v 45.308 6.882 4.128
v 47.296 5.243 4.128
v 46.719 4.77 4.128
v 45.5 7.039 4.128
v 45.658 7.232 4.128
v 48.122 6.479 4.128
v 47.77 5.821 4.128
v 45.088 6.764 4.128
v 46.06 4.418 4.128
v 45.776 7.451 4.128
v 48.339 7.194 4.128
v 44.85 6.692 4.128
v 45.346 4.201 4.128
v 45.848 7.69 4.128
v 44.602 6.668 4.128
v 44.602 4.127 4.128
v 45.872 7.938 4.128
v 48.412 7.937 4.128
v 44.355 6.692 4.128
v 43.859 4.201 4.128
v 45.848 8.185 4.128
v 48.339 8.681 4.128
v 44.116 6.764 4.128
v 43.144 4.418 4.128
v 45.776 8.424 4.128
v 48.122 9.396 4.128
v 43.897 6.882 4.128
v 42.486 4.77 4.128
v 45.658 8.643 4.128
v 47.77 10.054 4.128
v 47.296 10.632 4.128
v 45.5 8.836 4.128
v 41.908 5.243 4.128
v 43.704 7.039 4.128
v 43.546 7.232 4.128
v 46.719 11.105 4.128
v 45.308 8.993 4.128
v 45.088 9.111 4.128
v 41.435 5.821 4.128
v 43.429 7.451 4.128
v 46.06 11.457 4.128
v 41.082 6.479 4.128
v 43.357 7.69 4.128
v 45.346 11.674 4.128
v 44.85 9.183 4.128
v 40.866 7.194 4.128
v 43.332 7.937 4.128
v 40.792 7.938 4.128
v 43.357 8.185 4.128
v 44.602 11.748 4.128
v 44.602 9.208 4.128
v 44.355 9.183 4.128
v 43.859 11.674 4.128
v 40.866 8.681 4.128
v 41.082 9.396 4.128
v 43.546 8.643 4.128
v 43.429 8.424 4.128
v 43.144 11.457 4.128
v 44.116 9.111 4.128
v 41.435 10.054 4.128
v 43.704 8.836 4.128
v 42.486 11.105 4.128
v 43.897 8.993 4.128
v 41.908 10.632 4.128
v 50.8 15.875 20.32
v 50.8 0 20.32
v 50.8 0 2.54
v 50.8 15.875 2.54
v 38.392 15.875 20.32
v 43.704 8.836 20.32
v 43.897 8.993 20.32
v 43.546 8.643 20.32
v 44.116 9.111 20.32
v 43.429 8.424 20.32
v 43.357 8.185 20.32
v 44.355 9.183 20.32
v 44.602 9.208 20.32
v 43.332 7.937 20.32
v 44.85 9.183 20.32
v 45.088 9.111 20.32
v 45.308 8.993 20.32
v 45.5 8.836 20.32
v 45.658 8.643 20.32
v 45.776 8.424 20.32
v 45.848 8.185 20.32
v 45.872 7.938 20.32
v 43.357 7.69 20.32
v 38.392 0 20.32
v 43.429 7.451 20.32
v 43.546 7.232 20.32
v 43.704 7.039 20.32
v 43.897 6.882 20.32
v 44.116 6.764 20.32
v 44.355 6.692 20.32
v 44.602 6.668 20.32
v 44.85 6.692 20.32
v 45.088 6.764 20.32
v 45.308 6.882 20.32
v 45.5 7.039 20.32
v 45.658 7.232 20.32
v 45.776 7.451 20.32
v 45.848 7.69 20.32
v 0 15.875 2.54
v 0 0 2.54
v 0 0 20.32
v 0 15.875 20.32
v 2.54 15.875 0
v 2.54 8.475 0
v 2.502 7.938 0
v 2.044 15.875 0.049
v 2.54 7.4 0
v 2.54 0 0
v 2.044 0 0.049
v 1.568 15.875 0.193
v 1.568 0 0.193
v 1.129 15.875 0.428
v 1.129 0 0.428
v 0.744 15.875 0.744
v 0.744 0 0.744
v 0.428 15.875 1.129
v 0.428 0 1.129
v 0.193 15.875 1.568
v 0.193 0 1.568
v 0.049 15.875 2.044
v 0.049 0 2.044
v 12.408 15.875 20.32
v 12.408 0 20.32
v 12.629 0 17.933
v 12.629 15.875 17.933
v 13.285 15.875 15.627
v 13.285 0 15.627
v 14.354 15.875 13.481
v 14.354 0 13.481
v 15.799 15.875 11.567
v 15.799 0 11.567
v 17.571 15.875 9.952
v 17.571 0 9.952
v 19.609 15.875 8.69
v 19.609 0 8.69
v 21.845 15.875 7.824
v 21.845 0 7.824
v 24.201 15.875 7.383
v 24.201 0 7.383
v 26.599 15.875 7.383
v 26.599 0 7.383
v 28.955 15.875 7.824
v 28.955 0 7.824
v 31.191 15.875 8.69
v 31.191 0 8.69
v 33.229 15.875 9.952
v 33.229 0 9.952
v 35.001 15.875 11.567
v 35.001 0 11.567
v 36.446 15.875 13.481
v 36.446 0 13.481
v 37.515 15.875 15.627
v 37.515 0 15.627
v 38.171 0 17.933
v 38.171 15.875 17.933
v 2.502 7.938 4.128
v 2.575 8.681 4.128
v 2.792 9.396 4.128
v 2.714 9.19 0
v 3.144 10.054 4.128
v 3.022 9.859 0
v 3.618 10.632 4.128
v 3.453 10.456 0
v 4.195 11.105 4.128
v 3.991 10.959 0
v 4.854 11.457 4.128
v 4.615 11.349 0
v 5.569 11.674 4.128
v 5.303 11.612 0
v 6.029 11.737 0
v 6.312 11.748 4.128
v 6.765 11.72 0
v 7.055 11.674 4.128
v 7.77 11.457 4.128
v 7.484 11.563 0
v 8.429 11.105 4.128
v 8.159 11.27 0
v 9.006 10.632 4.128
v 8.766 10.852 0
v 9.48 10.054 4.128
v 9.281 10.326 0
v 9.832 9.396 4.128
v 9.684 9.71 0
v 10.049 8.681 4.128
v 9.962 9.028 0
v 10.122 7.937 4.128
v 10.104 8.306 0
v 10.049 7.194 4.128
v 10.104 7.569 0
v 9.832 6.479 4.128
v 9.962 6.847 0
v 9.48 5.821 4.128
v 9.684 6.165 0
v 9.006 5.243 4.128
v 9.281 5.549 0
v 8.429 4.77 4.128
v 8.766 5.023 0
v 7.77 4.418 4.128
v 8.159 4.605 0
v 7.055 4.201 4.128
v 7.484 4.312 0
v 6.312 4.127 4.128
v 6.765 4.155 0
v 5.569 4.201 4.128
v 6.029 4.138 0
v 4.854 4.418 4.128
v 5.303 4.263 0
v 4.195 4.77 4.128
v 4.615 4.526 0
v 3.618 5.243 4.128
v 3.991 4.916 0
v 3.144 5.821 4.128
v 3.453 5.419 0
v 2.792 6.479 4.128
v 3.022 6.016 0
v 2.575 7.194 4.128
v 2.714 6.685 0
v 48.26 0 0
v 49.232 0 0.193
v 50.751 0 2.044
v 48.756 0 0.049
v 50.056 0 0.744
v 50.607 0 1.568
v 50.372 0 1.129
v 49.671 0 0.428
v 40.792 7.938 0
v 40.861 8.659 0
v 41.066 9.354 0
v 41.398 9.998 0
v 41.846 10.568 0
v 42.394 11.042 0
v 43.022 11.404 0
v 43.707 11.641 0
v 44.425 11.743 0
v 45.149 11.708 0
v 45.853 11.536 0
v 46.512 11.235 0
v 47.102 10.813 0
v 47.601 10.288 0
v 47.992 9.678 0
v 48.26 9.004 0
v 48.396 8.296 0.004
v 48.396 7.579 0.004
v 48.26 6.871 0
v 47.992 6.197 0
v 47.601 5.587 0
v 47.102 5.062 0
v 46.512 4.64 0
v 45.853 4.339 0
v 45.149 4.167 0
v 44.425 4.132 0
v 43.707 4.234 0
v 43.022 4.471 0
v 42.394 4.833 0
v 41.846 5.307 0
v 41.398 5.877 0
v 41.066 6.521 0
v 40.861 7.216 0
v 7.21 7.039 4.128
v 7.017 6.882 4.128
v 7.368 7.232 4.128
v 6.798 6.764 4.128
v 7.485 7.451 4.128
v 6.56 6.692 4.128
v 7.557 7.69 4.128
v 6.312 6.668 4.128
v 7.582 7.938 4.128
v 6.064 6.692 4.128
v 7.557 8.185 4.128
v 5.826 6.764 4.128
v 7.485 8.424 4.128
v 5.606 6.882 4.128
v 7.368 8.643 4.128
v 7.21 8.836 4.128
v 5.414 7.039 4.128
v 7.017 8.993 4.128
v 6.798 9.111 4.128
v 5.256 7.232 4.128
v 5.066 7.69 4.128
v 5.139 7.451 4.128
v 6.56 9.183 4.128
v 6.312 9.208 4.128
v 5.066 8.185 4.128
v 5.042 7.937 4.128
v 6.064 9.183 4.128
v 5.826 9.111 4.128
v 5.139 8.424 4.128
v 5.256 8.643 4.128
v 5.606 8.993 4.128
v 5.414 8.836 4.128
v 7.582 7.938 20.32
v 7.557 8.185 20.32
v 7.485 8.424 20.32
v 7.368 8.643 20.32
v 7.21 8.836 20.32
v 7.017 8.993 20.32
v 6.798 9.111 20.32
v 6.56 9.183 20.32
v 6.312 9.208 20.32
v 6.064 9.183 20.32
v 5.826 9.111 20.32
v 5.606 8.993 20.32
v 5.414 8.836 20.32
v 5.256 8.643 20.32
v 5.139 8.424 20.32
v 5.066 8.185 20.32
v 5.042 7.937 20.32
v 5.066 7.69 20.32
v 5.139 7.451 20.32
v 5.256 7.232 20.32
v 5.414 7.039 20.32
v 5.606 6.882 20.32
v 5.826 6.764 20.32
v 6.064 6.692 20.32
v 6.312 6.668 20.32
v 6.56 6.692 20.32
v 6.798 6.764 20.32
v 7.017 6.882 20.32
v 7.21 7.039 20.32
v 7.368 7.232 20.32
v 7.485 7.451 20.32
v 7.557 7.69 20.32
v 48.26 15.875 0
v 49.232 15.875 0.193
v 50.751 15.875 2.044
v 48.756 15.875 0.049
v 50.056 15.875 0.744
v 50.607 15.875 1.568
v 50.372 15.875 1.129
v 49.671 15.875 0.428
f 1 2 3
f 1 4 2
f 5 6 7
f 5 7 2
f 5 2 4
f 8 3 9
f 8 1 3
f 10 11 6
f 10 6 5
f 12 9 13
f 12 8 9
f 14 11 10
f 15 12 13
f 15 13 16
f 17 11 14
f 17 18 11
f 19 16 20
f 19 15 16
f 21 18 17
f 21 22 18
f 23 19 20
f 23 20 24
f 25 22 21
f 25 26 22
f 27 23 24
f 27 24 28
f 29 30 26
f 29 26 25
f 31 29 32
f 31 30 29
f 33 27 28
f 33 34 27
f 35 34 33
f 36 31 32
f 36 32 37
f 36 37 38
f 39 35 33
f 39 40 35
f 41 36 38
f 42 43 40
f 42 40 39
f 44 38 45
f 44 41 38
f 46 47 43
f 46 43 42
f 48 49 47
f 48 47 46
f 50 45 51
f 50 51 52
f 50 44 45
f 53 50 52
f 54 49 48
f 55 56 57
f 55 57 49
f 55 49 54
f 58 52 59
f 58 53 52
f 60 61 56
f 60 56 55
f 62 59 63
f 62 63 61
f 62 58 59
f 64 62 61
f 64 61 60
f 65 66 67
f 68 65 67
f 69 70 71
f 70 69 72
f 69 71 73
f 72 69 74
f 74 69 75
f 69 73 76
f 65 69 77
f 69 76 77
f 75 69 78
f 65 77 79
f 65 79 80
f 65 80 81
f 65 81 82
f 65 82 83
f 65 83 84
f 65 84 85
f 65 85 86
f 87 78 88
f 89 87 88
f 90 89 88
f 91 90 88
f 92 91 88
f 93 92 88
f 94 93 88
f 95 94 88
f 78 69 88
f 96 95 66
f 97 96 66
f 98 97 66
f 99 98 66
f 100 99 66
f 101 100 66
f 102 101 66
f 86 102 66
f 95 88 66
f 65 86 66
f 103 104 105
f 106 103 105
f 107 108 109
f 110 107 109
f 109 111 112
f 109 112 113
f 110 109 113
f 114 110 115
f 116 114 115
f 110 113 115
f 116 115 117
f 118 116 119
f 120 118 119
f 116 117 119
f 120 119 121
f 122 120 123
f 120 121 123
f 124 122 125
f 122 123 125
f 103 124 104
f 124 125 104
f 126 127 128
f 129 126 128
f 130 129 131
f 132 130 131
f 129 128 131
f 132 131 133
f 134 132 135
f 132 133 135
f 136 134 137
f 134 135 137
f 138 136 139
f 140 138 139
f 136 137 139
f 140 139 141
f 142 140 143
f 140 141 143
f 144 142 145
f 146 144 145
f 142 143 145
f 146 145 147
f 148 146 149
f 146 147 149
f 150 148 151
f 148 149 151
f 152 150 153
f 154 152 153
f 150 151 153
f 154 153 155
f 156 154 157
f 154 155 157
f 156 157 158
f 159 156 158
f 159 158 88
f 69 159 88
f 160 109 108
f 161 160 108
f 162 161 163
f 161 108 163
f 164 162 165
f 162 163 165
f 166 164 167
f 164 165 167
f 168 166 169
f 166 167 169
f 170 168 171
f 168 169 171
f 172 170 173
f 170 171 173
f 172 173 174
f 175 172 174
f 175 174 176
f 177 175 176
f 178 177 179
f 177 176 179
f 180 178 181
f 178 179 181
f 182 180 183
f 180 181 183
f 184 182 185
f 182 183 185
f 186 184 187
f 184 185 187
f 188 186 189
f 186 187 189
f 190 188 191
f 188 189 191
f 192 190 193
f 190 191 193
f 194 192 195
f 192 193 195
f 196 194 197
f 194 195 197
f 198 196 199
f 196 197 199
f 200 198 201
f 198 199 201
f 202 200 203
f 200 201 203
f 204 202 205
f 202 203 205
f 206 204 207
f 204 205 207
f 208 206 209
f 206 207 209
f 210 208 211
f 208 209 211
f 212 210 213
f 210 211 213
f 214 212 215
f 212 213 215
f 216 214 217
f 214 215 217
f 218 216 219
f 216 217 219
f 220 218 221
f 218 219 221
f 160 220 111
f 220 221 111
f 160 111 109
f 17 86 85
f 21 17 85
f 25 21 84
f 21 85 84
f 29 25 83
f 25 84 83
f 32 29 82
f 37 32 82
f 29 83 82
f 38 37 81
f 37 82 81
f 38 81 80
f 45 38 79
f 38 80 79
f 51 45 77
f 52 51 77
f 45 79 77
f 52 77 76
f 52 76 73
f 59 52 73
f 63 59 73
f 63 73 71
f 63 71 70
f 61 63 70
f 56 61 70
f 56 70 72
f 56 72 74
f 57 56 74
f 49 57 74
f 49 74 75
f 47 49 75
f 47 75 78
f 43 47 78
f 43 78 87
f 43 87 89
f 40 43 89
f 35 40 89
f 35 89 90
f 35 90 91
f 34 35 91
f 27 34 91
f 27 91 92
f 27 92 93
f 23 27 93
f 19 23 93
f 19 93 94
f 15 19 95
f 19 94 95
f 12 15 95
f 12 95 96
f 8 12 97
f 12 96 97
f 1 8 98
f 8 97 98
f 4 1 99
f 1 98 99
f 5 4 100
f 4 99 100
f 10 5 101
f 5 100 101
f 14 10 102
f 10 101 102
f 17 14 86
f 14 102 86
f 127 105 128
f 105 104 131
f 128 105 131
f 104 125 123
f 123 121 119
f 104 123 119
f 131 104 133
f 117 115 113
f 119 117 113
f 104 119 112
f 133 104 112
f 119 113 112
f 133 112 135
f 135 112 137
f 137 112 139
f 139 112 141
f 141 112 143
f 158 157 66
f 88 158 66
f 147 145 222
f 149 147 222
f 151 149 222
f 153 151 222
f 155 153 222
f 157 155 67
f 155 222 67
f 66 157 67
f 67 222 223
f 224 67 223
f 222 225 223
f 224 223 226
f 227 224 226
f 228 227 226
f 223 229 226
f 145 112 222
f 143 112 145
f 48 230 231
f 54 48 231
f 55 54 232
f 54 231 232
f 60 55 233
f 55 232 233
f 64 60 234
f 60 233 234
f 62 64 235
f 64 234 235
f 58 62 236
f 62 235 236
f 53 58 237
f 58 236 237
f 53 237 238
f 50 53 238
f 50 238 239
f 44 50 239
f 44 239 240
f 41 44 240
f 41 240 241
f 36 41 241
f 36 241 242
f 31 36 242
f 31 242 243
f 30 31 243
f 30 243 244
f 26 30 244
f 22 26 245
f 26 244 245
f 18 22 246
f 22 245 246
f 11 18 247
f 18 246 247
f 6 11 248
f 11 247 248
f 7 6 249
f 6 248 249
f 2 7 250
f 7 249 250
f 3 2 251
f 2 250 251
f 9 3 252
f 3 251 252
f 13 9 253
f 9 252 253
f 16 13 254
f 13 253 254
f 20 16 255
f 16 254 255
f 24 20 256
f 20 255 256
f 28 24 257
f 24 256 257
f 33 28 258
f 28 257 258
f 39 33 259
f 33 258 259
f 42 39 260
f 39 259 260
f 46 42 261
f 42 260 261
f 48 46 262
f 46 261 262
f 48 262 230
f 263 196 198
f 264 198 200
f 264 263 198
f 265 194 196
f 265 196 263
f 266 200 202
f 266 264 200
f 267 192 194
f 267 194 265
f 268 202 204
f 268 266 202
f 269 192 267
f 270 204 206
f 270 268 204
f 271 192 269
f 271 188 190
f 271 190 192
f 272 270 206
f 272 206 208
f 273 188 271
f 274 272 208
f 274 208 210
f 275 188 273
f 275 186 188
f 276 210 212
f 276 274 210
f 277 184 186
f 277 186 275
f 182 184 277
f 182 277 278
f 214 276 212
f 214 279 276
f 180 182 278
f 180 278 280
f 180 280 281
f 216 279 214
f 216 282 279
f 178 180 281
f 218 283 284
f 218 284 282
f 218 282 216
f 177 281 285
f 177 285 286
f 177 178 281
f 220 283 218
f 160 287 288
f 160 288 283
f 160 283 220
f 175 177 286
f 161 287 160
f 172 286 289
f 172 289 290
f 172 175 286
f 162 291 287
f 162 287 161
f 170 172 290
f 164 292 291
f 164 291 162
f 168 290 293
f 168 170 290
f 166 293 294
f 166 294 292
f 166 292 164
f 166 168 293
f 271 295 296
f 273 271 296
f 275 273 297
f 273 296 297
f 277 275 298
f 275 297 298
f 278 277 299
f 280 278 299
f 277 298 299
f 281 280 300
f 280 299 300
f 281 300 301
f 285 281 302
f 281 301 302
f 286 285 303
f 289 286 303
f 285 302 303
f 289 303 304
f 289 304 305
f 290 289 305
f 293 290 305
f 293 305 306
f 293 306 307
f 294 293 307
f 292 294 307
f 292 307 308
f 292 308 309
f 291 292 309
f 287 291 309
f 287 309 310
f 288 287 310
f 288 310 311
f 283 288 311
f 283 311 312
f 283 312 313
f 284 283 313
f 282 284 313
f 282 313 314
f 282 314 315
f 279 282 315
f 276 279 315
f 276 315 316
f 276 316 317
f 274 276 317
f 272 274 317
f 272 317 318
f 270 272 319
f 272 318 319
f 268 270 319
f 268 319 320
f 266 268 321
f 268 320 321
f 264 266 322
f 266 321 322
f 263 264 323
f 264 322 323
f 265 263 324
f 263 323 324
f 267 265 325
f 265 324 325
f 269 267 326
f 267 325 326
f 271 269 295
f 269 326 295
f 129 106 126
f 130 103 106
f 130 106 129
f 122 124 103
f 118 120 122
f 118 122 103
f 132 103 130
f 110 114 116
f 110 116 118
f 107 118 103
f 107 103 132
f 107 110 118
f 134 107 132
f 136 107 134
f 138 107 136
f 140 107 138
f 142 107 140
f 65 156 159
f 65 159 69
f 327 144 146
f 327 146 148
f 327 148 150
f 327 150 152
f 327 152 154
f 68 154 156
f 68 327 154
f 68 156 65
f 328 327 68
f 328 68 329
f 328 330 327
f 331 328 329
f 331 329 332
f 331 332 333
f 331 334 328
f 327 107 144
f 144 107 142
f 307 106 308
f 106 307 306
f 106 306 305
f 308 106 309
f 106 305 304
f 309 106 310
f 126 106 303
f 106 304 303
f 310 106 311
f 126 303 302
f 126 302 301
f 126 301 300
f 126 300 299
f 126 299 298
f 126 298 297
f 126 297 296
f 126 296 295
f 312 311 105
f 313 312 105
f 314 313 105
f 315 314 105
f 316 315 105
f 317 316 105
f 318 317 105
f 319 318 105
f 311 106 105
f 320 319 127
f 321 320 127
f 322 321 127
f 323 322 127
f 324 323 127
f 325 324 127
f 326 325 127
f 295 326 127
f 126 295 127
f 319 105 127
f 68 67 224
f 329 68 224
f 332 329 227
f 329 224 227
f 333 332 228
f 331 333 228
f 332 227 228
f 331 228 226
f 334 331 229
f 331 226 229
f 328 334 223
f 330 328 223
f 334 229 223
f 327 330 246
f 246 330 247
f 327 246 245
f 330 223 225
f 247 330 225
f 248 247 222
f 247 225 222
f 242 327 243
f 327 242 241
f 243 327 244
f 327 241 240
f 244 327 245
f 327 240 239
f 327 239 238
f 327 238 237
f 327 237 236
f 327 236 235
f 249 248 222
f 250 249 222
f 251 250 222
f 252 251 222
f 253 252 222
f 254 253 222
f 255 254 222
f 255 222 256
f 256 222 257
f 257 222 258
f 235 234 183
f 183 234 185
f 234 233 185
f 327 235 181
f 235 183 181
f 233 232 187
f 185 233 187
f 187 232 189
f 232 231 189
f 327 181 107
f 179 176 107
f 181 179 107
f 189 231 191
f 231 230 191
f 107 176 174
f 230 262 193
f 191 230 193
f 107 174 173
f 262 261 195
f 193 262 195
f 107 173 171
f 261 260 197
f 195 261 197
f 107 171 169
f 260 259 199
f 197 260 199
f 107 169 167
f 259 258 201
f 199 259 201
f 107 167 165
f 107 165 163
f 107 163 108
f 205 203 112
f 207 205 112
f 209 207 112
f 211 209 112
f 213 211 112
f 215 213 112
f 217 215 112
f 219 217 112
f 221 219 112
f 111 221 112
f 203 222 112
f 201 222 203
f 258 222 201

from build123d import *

# Parameters (mm, degrees)
BOSS_EXTRUDE1_DEPTH = 15.875
SKETCH2_R           = 1.27
CUT_EXTRUDE1_DEPTH  = 57.969799236
SKETCH3_R           = 3.81
CUT_EXTRUDE2_DEPTH  = 4.1275


with BuildPart() as part:
    # Sketch1 → Boss-Extrude1 (new body)
    with BuildSketch(Plane(origin=(0, 0, 0), x_dir=(1, 0, 0), z_dir=(0, 1, 0))):
        with BuildLine():
            Line((48.26, 0), (2.54, 0))
            ThreePointArc((2.54, 0), (0.743948776, -0.743948776), (0, -2.54))
            Line((0, -2.54), (0, -20.32))
            Line((0, -20.32), (12.4079, -20.32))
            ThreePointArc((12.4079, -20.32), (25.4, -7.3279), (38.3921, -20.32))
            Line((38.3921, -20.32), (50.8, -20.32))
            Line((50.8, -20.32), (50.8, -2.54))
            ThreePointArc((50.8, -2.54), (50.056051224, -0.743948776), (48.26, 0))
        make_face()
    extrude(amount=BOSS_EXTRUDE1_DEPTH)

    # Sketch2 → Cut-Extrude1 (cut, through all)
    with BuildSketch(Plane.XY.offset(20.32)):
        with Locations((6.3119, 7.9375)):
            Circle(SKETCH2_R)
        with Locations((44.6024, 7.9375)):
            Circle(SKETCH2_R)
    extrude(amount=-CUT_EXTRUDE1_DEPTH, mode=Mode.SUBTRACT)

    # Sketch3 → Cut-Extrude2 (cut)
    with BuildSketch(Plane(origin=(0, 0, 0), x_dir=(-1, 0, 0), z_dir=(0, 0, -1))):
        with Locations((-44.6024, 7.9375)):
            Circle(SKETCH3_R)
        with Locations((-6.3119, 7.9375)):
            Circle(SKETCH3_R)
    extrude(amount=-CUT_EXTRUDE2_DEPTH, mode=Mode.SUBTRACT)


solid = part.part
